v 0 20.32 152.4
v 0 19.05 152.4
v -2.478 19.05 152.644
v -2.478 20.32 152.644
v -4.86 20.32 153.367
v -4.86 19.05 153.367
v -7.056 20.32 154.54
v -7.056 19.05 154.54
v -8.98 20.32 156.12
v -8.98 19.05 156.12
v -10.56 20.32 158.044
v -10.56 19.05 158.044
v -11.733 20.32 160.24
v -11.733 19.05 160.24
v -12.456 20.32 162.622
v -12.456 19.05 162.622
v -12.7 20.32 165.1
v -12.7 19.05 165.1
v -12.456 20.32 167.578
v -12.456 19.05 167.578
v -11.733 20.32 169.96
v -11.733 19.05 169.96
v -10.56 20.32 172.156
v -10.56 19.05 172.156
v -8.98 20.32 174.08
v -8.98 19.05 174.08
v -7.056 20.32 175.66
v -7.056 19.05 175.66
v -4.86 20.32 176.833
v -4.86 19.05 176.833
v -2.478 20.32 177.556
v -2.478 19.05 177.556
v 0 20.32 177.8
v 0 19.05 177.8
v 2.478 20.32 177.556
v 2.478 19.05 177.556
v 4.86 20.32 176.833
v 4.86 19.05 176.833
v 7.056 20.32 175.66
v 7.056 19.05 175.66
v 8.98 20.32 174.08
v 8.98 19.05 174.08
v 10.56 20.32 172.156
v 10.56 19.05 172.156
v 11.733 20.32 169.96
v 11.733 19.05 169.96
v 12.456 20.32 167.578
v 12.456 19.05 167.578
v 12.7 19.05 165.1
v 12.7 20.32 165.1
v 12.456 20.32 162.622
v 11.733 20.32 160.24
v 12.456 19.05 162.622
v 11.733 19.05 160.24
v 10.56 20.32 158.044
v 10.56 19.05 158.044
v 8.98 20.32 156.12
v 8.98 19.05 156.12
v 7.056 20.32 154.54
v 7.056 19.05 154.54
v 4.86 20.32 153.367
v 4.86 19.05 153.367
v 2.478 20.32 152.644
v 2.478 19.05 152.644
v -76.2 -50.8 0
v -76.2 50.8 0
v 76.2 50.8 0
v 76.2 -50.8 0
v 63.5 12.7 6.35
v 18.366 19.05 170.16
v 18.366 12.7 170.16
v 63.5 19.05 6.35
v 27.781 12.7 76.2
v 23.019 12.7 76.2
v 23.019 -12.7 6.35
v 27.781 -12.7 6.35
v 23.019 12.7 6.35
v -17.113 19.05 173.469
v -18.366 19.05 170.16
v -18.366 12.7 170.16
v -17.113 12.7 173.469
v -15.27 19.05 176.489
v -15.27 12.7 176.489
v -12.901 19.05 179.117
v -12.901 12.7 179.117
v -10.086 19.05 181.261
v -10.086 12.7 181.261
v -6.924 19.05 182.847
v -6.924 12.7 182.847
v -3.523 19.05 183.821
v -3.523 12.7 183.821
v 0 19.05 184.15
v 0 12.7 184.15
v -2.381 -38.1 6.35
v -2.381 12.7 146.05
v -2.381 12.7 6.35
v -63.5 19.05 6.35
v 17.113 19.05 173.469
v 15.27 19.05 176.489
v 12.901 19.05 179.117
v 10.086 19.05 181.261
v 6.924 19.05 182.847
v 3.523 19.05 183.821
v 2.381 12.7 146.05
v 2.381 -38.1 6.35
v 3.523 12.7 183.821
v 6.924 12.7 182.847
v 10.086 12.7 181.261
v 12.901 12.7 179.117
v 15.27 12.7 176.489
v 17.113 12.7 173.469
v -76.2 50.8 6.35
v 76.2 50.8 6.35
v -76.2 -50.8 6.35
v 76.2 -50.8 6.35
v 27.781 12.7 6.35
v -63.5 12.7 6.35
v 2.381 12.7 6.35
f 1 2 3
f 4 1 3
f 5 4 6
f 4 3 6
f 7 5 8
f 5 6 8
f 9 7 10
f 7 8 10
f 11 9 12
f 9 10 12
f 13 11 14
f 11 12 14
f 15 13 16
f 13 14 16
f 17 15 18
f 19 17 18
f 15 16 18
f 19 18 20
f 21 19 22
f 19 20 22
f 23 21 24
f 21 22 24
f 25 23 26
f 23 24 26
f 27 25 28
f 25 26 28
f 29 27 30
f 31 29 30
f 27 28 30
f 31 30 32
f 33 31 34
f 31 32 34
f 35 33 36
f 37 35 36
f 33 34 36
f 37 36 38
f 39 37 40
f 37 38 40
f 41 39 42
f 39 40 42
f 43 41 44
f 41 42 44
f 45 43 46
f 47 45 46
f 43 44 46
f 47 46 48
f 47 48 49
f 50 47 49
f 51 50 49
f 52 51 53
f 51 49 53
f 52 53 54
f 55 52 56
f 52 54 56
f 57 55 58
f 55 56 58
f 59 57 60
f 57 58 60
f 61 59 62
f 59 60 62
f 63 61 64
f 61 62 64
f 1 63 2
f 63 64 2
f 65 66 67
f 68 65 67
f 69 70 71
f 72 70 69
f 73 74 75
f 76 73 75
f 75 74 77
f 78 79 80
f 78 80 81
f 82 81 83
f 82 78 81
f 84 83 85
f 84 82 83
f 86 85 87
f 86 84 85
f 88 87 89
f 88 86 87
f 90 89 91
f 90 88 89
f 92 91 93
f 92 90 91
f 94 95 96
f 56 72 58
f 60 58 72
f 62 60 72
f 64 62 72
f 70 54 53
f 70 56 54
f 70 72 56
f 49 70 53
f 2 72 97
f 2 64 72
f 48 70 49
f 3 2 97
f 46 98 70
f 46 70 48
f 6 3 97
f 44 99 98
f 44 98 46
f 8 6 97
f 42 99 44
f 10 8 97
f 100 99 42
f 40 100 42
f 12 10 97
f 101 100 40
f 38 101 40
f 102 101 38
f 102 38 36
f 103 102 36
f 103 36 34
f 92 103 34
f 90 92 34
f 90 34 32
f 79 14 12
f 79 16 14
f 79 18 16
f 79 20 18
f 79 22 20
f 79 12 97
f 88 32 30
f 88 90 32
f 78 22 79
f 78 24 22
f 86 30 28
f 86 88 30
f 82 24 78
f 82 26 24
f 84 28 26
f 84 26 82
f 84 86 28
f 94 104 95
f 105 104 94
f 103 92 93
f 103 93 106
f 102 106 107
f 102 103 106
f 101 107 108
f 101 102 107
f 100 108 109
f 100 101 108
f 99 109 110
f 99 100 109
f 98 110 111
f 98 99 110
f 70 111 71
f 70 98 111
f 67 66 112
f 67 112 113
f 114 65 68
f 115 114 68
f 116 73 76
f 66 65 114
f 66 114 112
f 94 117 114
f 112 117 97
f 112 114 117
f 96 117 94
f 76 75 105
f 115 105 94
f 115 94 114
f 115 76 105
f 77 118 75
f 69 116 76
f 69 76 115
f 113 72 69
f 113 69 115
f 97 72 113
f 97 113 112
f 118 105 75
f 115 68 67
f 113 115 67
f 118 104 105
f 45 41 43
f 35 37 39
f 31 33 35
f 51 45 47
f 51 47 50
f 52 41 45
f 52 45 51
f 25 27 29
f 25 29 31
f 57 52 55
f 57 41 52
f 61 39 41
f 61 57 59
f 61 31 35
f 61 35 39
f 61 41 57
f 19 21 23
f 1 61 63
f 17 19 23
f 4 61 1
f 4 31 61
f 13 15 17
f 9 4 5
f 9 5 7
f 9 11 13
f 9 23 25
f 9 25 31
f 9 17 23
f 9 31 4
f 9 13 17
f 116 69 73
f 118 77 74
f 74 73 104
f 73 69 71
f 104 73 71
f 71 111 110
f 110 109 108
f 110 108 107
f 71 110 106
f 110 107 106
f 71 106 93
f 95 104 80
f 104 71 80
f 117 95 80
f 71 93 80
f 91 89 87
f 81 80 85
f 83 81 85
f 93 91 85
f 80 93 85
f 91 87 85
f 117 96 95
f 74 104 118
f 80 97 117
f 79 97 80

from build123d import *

# Parameters (mm, degrees)
SKETCH1_W      = 152.4
SKETCH1_H      = 101.6
EXTRUDE1_DEPTH = 6.35
EXTRUDE2_DEPTH = 6.35
SKETCH4_R      = 12.7
EXTRUDE3_DEPTH = 1.27
EXTRUDE4_DEPTH = 2.38125
RIB4_REACH     = 218.366
SKETCH8_WALL_W = 509.057660384
SKETCH8_WALL_H = 4.7625


with BuildPart() as part:
    # Sketch1 → Extrude1 (new body)
    with BuildSketch(Plane.XY):
        Rectangle(SKETCH1_W, SKETCH1_H)
    extrude(amount=EXTRUDE1_DEPTH)

    # Sketch3 → Extrude2 (add)
    with BuildSketch(Plane(origin=(0, 19.05, 0), x_dir=(-1, 0, 0), z_dir=(0, 1, 0))):
        with BuildLine():
            Line((63.5, 6.35), (18.365629617, 170.160251847))
            ThreePointArc((18.365629617, 170.160251847), (11.54349822, 180.254212248), (0, 184.15))
            ThreePointArc((0, 184.15), (-11.54349822, 180.254212248), (-18.365629617, 170.160251847))
            Line((-18.365629617, 170.160251847), (-63.5, 6.35))
            Line((-63.5, 6.35), (63.5, 6.35))
        make_face()
    extrude(amount=-EXTRUDE2_DEPTH)

    # Sketch4 → Extrude3 (add)
    with BuildSketch(Plane(origin=(0, 19.05, 0), x_dir=(-1, 0, 0), z_dir=(0, 1, 0))):
        with Locations(Location((0, 165.1, 0), (0, 0, 270))):
            Circle(SKETCH4_R)
    extrude(amount=EXTRUDE3_DEPTH)

    # Sketch5 → Extrude4 (add, symmetric)
    with BuildSketch(Plane(origin=(0, 0, 0), x_dir=(0, 0, -1), z_dir=(1, 0, 0))):
        Polygon((-146.05, 12.7), (-6.35, -38.1), (-6.35, 12.7), align=None)
    extrude(amount=EXTRUDE4_DEPTH, both=True)

    # Sketch8 wall → Rib4 (add, up to next)
    with BuildSketch(Plane(origin=(25.4, 0, 41.275), x_dir=(0, -0.341743063087, -0.939793423488), z_dir=(0, 0.939793423488, -0.341743063087)), mode=Mode.PRIVATE) as rib4_sk1:
        Rectangle(SKETCH8_WALL_W, SKETCH8_WALL_H)
    rib4_tool1 = extrude(rib4_sk1.sketch, amount=RIB4_REACH, mode=Mode.PRIVATE) - part.part
    add(rib4_tool1.solids().sort_by_distance((25.4, 0, 41.275))[0])


solid = part.part
